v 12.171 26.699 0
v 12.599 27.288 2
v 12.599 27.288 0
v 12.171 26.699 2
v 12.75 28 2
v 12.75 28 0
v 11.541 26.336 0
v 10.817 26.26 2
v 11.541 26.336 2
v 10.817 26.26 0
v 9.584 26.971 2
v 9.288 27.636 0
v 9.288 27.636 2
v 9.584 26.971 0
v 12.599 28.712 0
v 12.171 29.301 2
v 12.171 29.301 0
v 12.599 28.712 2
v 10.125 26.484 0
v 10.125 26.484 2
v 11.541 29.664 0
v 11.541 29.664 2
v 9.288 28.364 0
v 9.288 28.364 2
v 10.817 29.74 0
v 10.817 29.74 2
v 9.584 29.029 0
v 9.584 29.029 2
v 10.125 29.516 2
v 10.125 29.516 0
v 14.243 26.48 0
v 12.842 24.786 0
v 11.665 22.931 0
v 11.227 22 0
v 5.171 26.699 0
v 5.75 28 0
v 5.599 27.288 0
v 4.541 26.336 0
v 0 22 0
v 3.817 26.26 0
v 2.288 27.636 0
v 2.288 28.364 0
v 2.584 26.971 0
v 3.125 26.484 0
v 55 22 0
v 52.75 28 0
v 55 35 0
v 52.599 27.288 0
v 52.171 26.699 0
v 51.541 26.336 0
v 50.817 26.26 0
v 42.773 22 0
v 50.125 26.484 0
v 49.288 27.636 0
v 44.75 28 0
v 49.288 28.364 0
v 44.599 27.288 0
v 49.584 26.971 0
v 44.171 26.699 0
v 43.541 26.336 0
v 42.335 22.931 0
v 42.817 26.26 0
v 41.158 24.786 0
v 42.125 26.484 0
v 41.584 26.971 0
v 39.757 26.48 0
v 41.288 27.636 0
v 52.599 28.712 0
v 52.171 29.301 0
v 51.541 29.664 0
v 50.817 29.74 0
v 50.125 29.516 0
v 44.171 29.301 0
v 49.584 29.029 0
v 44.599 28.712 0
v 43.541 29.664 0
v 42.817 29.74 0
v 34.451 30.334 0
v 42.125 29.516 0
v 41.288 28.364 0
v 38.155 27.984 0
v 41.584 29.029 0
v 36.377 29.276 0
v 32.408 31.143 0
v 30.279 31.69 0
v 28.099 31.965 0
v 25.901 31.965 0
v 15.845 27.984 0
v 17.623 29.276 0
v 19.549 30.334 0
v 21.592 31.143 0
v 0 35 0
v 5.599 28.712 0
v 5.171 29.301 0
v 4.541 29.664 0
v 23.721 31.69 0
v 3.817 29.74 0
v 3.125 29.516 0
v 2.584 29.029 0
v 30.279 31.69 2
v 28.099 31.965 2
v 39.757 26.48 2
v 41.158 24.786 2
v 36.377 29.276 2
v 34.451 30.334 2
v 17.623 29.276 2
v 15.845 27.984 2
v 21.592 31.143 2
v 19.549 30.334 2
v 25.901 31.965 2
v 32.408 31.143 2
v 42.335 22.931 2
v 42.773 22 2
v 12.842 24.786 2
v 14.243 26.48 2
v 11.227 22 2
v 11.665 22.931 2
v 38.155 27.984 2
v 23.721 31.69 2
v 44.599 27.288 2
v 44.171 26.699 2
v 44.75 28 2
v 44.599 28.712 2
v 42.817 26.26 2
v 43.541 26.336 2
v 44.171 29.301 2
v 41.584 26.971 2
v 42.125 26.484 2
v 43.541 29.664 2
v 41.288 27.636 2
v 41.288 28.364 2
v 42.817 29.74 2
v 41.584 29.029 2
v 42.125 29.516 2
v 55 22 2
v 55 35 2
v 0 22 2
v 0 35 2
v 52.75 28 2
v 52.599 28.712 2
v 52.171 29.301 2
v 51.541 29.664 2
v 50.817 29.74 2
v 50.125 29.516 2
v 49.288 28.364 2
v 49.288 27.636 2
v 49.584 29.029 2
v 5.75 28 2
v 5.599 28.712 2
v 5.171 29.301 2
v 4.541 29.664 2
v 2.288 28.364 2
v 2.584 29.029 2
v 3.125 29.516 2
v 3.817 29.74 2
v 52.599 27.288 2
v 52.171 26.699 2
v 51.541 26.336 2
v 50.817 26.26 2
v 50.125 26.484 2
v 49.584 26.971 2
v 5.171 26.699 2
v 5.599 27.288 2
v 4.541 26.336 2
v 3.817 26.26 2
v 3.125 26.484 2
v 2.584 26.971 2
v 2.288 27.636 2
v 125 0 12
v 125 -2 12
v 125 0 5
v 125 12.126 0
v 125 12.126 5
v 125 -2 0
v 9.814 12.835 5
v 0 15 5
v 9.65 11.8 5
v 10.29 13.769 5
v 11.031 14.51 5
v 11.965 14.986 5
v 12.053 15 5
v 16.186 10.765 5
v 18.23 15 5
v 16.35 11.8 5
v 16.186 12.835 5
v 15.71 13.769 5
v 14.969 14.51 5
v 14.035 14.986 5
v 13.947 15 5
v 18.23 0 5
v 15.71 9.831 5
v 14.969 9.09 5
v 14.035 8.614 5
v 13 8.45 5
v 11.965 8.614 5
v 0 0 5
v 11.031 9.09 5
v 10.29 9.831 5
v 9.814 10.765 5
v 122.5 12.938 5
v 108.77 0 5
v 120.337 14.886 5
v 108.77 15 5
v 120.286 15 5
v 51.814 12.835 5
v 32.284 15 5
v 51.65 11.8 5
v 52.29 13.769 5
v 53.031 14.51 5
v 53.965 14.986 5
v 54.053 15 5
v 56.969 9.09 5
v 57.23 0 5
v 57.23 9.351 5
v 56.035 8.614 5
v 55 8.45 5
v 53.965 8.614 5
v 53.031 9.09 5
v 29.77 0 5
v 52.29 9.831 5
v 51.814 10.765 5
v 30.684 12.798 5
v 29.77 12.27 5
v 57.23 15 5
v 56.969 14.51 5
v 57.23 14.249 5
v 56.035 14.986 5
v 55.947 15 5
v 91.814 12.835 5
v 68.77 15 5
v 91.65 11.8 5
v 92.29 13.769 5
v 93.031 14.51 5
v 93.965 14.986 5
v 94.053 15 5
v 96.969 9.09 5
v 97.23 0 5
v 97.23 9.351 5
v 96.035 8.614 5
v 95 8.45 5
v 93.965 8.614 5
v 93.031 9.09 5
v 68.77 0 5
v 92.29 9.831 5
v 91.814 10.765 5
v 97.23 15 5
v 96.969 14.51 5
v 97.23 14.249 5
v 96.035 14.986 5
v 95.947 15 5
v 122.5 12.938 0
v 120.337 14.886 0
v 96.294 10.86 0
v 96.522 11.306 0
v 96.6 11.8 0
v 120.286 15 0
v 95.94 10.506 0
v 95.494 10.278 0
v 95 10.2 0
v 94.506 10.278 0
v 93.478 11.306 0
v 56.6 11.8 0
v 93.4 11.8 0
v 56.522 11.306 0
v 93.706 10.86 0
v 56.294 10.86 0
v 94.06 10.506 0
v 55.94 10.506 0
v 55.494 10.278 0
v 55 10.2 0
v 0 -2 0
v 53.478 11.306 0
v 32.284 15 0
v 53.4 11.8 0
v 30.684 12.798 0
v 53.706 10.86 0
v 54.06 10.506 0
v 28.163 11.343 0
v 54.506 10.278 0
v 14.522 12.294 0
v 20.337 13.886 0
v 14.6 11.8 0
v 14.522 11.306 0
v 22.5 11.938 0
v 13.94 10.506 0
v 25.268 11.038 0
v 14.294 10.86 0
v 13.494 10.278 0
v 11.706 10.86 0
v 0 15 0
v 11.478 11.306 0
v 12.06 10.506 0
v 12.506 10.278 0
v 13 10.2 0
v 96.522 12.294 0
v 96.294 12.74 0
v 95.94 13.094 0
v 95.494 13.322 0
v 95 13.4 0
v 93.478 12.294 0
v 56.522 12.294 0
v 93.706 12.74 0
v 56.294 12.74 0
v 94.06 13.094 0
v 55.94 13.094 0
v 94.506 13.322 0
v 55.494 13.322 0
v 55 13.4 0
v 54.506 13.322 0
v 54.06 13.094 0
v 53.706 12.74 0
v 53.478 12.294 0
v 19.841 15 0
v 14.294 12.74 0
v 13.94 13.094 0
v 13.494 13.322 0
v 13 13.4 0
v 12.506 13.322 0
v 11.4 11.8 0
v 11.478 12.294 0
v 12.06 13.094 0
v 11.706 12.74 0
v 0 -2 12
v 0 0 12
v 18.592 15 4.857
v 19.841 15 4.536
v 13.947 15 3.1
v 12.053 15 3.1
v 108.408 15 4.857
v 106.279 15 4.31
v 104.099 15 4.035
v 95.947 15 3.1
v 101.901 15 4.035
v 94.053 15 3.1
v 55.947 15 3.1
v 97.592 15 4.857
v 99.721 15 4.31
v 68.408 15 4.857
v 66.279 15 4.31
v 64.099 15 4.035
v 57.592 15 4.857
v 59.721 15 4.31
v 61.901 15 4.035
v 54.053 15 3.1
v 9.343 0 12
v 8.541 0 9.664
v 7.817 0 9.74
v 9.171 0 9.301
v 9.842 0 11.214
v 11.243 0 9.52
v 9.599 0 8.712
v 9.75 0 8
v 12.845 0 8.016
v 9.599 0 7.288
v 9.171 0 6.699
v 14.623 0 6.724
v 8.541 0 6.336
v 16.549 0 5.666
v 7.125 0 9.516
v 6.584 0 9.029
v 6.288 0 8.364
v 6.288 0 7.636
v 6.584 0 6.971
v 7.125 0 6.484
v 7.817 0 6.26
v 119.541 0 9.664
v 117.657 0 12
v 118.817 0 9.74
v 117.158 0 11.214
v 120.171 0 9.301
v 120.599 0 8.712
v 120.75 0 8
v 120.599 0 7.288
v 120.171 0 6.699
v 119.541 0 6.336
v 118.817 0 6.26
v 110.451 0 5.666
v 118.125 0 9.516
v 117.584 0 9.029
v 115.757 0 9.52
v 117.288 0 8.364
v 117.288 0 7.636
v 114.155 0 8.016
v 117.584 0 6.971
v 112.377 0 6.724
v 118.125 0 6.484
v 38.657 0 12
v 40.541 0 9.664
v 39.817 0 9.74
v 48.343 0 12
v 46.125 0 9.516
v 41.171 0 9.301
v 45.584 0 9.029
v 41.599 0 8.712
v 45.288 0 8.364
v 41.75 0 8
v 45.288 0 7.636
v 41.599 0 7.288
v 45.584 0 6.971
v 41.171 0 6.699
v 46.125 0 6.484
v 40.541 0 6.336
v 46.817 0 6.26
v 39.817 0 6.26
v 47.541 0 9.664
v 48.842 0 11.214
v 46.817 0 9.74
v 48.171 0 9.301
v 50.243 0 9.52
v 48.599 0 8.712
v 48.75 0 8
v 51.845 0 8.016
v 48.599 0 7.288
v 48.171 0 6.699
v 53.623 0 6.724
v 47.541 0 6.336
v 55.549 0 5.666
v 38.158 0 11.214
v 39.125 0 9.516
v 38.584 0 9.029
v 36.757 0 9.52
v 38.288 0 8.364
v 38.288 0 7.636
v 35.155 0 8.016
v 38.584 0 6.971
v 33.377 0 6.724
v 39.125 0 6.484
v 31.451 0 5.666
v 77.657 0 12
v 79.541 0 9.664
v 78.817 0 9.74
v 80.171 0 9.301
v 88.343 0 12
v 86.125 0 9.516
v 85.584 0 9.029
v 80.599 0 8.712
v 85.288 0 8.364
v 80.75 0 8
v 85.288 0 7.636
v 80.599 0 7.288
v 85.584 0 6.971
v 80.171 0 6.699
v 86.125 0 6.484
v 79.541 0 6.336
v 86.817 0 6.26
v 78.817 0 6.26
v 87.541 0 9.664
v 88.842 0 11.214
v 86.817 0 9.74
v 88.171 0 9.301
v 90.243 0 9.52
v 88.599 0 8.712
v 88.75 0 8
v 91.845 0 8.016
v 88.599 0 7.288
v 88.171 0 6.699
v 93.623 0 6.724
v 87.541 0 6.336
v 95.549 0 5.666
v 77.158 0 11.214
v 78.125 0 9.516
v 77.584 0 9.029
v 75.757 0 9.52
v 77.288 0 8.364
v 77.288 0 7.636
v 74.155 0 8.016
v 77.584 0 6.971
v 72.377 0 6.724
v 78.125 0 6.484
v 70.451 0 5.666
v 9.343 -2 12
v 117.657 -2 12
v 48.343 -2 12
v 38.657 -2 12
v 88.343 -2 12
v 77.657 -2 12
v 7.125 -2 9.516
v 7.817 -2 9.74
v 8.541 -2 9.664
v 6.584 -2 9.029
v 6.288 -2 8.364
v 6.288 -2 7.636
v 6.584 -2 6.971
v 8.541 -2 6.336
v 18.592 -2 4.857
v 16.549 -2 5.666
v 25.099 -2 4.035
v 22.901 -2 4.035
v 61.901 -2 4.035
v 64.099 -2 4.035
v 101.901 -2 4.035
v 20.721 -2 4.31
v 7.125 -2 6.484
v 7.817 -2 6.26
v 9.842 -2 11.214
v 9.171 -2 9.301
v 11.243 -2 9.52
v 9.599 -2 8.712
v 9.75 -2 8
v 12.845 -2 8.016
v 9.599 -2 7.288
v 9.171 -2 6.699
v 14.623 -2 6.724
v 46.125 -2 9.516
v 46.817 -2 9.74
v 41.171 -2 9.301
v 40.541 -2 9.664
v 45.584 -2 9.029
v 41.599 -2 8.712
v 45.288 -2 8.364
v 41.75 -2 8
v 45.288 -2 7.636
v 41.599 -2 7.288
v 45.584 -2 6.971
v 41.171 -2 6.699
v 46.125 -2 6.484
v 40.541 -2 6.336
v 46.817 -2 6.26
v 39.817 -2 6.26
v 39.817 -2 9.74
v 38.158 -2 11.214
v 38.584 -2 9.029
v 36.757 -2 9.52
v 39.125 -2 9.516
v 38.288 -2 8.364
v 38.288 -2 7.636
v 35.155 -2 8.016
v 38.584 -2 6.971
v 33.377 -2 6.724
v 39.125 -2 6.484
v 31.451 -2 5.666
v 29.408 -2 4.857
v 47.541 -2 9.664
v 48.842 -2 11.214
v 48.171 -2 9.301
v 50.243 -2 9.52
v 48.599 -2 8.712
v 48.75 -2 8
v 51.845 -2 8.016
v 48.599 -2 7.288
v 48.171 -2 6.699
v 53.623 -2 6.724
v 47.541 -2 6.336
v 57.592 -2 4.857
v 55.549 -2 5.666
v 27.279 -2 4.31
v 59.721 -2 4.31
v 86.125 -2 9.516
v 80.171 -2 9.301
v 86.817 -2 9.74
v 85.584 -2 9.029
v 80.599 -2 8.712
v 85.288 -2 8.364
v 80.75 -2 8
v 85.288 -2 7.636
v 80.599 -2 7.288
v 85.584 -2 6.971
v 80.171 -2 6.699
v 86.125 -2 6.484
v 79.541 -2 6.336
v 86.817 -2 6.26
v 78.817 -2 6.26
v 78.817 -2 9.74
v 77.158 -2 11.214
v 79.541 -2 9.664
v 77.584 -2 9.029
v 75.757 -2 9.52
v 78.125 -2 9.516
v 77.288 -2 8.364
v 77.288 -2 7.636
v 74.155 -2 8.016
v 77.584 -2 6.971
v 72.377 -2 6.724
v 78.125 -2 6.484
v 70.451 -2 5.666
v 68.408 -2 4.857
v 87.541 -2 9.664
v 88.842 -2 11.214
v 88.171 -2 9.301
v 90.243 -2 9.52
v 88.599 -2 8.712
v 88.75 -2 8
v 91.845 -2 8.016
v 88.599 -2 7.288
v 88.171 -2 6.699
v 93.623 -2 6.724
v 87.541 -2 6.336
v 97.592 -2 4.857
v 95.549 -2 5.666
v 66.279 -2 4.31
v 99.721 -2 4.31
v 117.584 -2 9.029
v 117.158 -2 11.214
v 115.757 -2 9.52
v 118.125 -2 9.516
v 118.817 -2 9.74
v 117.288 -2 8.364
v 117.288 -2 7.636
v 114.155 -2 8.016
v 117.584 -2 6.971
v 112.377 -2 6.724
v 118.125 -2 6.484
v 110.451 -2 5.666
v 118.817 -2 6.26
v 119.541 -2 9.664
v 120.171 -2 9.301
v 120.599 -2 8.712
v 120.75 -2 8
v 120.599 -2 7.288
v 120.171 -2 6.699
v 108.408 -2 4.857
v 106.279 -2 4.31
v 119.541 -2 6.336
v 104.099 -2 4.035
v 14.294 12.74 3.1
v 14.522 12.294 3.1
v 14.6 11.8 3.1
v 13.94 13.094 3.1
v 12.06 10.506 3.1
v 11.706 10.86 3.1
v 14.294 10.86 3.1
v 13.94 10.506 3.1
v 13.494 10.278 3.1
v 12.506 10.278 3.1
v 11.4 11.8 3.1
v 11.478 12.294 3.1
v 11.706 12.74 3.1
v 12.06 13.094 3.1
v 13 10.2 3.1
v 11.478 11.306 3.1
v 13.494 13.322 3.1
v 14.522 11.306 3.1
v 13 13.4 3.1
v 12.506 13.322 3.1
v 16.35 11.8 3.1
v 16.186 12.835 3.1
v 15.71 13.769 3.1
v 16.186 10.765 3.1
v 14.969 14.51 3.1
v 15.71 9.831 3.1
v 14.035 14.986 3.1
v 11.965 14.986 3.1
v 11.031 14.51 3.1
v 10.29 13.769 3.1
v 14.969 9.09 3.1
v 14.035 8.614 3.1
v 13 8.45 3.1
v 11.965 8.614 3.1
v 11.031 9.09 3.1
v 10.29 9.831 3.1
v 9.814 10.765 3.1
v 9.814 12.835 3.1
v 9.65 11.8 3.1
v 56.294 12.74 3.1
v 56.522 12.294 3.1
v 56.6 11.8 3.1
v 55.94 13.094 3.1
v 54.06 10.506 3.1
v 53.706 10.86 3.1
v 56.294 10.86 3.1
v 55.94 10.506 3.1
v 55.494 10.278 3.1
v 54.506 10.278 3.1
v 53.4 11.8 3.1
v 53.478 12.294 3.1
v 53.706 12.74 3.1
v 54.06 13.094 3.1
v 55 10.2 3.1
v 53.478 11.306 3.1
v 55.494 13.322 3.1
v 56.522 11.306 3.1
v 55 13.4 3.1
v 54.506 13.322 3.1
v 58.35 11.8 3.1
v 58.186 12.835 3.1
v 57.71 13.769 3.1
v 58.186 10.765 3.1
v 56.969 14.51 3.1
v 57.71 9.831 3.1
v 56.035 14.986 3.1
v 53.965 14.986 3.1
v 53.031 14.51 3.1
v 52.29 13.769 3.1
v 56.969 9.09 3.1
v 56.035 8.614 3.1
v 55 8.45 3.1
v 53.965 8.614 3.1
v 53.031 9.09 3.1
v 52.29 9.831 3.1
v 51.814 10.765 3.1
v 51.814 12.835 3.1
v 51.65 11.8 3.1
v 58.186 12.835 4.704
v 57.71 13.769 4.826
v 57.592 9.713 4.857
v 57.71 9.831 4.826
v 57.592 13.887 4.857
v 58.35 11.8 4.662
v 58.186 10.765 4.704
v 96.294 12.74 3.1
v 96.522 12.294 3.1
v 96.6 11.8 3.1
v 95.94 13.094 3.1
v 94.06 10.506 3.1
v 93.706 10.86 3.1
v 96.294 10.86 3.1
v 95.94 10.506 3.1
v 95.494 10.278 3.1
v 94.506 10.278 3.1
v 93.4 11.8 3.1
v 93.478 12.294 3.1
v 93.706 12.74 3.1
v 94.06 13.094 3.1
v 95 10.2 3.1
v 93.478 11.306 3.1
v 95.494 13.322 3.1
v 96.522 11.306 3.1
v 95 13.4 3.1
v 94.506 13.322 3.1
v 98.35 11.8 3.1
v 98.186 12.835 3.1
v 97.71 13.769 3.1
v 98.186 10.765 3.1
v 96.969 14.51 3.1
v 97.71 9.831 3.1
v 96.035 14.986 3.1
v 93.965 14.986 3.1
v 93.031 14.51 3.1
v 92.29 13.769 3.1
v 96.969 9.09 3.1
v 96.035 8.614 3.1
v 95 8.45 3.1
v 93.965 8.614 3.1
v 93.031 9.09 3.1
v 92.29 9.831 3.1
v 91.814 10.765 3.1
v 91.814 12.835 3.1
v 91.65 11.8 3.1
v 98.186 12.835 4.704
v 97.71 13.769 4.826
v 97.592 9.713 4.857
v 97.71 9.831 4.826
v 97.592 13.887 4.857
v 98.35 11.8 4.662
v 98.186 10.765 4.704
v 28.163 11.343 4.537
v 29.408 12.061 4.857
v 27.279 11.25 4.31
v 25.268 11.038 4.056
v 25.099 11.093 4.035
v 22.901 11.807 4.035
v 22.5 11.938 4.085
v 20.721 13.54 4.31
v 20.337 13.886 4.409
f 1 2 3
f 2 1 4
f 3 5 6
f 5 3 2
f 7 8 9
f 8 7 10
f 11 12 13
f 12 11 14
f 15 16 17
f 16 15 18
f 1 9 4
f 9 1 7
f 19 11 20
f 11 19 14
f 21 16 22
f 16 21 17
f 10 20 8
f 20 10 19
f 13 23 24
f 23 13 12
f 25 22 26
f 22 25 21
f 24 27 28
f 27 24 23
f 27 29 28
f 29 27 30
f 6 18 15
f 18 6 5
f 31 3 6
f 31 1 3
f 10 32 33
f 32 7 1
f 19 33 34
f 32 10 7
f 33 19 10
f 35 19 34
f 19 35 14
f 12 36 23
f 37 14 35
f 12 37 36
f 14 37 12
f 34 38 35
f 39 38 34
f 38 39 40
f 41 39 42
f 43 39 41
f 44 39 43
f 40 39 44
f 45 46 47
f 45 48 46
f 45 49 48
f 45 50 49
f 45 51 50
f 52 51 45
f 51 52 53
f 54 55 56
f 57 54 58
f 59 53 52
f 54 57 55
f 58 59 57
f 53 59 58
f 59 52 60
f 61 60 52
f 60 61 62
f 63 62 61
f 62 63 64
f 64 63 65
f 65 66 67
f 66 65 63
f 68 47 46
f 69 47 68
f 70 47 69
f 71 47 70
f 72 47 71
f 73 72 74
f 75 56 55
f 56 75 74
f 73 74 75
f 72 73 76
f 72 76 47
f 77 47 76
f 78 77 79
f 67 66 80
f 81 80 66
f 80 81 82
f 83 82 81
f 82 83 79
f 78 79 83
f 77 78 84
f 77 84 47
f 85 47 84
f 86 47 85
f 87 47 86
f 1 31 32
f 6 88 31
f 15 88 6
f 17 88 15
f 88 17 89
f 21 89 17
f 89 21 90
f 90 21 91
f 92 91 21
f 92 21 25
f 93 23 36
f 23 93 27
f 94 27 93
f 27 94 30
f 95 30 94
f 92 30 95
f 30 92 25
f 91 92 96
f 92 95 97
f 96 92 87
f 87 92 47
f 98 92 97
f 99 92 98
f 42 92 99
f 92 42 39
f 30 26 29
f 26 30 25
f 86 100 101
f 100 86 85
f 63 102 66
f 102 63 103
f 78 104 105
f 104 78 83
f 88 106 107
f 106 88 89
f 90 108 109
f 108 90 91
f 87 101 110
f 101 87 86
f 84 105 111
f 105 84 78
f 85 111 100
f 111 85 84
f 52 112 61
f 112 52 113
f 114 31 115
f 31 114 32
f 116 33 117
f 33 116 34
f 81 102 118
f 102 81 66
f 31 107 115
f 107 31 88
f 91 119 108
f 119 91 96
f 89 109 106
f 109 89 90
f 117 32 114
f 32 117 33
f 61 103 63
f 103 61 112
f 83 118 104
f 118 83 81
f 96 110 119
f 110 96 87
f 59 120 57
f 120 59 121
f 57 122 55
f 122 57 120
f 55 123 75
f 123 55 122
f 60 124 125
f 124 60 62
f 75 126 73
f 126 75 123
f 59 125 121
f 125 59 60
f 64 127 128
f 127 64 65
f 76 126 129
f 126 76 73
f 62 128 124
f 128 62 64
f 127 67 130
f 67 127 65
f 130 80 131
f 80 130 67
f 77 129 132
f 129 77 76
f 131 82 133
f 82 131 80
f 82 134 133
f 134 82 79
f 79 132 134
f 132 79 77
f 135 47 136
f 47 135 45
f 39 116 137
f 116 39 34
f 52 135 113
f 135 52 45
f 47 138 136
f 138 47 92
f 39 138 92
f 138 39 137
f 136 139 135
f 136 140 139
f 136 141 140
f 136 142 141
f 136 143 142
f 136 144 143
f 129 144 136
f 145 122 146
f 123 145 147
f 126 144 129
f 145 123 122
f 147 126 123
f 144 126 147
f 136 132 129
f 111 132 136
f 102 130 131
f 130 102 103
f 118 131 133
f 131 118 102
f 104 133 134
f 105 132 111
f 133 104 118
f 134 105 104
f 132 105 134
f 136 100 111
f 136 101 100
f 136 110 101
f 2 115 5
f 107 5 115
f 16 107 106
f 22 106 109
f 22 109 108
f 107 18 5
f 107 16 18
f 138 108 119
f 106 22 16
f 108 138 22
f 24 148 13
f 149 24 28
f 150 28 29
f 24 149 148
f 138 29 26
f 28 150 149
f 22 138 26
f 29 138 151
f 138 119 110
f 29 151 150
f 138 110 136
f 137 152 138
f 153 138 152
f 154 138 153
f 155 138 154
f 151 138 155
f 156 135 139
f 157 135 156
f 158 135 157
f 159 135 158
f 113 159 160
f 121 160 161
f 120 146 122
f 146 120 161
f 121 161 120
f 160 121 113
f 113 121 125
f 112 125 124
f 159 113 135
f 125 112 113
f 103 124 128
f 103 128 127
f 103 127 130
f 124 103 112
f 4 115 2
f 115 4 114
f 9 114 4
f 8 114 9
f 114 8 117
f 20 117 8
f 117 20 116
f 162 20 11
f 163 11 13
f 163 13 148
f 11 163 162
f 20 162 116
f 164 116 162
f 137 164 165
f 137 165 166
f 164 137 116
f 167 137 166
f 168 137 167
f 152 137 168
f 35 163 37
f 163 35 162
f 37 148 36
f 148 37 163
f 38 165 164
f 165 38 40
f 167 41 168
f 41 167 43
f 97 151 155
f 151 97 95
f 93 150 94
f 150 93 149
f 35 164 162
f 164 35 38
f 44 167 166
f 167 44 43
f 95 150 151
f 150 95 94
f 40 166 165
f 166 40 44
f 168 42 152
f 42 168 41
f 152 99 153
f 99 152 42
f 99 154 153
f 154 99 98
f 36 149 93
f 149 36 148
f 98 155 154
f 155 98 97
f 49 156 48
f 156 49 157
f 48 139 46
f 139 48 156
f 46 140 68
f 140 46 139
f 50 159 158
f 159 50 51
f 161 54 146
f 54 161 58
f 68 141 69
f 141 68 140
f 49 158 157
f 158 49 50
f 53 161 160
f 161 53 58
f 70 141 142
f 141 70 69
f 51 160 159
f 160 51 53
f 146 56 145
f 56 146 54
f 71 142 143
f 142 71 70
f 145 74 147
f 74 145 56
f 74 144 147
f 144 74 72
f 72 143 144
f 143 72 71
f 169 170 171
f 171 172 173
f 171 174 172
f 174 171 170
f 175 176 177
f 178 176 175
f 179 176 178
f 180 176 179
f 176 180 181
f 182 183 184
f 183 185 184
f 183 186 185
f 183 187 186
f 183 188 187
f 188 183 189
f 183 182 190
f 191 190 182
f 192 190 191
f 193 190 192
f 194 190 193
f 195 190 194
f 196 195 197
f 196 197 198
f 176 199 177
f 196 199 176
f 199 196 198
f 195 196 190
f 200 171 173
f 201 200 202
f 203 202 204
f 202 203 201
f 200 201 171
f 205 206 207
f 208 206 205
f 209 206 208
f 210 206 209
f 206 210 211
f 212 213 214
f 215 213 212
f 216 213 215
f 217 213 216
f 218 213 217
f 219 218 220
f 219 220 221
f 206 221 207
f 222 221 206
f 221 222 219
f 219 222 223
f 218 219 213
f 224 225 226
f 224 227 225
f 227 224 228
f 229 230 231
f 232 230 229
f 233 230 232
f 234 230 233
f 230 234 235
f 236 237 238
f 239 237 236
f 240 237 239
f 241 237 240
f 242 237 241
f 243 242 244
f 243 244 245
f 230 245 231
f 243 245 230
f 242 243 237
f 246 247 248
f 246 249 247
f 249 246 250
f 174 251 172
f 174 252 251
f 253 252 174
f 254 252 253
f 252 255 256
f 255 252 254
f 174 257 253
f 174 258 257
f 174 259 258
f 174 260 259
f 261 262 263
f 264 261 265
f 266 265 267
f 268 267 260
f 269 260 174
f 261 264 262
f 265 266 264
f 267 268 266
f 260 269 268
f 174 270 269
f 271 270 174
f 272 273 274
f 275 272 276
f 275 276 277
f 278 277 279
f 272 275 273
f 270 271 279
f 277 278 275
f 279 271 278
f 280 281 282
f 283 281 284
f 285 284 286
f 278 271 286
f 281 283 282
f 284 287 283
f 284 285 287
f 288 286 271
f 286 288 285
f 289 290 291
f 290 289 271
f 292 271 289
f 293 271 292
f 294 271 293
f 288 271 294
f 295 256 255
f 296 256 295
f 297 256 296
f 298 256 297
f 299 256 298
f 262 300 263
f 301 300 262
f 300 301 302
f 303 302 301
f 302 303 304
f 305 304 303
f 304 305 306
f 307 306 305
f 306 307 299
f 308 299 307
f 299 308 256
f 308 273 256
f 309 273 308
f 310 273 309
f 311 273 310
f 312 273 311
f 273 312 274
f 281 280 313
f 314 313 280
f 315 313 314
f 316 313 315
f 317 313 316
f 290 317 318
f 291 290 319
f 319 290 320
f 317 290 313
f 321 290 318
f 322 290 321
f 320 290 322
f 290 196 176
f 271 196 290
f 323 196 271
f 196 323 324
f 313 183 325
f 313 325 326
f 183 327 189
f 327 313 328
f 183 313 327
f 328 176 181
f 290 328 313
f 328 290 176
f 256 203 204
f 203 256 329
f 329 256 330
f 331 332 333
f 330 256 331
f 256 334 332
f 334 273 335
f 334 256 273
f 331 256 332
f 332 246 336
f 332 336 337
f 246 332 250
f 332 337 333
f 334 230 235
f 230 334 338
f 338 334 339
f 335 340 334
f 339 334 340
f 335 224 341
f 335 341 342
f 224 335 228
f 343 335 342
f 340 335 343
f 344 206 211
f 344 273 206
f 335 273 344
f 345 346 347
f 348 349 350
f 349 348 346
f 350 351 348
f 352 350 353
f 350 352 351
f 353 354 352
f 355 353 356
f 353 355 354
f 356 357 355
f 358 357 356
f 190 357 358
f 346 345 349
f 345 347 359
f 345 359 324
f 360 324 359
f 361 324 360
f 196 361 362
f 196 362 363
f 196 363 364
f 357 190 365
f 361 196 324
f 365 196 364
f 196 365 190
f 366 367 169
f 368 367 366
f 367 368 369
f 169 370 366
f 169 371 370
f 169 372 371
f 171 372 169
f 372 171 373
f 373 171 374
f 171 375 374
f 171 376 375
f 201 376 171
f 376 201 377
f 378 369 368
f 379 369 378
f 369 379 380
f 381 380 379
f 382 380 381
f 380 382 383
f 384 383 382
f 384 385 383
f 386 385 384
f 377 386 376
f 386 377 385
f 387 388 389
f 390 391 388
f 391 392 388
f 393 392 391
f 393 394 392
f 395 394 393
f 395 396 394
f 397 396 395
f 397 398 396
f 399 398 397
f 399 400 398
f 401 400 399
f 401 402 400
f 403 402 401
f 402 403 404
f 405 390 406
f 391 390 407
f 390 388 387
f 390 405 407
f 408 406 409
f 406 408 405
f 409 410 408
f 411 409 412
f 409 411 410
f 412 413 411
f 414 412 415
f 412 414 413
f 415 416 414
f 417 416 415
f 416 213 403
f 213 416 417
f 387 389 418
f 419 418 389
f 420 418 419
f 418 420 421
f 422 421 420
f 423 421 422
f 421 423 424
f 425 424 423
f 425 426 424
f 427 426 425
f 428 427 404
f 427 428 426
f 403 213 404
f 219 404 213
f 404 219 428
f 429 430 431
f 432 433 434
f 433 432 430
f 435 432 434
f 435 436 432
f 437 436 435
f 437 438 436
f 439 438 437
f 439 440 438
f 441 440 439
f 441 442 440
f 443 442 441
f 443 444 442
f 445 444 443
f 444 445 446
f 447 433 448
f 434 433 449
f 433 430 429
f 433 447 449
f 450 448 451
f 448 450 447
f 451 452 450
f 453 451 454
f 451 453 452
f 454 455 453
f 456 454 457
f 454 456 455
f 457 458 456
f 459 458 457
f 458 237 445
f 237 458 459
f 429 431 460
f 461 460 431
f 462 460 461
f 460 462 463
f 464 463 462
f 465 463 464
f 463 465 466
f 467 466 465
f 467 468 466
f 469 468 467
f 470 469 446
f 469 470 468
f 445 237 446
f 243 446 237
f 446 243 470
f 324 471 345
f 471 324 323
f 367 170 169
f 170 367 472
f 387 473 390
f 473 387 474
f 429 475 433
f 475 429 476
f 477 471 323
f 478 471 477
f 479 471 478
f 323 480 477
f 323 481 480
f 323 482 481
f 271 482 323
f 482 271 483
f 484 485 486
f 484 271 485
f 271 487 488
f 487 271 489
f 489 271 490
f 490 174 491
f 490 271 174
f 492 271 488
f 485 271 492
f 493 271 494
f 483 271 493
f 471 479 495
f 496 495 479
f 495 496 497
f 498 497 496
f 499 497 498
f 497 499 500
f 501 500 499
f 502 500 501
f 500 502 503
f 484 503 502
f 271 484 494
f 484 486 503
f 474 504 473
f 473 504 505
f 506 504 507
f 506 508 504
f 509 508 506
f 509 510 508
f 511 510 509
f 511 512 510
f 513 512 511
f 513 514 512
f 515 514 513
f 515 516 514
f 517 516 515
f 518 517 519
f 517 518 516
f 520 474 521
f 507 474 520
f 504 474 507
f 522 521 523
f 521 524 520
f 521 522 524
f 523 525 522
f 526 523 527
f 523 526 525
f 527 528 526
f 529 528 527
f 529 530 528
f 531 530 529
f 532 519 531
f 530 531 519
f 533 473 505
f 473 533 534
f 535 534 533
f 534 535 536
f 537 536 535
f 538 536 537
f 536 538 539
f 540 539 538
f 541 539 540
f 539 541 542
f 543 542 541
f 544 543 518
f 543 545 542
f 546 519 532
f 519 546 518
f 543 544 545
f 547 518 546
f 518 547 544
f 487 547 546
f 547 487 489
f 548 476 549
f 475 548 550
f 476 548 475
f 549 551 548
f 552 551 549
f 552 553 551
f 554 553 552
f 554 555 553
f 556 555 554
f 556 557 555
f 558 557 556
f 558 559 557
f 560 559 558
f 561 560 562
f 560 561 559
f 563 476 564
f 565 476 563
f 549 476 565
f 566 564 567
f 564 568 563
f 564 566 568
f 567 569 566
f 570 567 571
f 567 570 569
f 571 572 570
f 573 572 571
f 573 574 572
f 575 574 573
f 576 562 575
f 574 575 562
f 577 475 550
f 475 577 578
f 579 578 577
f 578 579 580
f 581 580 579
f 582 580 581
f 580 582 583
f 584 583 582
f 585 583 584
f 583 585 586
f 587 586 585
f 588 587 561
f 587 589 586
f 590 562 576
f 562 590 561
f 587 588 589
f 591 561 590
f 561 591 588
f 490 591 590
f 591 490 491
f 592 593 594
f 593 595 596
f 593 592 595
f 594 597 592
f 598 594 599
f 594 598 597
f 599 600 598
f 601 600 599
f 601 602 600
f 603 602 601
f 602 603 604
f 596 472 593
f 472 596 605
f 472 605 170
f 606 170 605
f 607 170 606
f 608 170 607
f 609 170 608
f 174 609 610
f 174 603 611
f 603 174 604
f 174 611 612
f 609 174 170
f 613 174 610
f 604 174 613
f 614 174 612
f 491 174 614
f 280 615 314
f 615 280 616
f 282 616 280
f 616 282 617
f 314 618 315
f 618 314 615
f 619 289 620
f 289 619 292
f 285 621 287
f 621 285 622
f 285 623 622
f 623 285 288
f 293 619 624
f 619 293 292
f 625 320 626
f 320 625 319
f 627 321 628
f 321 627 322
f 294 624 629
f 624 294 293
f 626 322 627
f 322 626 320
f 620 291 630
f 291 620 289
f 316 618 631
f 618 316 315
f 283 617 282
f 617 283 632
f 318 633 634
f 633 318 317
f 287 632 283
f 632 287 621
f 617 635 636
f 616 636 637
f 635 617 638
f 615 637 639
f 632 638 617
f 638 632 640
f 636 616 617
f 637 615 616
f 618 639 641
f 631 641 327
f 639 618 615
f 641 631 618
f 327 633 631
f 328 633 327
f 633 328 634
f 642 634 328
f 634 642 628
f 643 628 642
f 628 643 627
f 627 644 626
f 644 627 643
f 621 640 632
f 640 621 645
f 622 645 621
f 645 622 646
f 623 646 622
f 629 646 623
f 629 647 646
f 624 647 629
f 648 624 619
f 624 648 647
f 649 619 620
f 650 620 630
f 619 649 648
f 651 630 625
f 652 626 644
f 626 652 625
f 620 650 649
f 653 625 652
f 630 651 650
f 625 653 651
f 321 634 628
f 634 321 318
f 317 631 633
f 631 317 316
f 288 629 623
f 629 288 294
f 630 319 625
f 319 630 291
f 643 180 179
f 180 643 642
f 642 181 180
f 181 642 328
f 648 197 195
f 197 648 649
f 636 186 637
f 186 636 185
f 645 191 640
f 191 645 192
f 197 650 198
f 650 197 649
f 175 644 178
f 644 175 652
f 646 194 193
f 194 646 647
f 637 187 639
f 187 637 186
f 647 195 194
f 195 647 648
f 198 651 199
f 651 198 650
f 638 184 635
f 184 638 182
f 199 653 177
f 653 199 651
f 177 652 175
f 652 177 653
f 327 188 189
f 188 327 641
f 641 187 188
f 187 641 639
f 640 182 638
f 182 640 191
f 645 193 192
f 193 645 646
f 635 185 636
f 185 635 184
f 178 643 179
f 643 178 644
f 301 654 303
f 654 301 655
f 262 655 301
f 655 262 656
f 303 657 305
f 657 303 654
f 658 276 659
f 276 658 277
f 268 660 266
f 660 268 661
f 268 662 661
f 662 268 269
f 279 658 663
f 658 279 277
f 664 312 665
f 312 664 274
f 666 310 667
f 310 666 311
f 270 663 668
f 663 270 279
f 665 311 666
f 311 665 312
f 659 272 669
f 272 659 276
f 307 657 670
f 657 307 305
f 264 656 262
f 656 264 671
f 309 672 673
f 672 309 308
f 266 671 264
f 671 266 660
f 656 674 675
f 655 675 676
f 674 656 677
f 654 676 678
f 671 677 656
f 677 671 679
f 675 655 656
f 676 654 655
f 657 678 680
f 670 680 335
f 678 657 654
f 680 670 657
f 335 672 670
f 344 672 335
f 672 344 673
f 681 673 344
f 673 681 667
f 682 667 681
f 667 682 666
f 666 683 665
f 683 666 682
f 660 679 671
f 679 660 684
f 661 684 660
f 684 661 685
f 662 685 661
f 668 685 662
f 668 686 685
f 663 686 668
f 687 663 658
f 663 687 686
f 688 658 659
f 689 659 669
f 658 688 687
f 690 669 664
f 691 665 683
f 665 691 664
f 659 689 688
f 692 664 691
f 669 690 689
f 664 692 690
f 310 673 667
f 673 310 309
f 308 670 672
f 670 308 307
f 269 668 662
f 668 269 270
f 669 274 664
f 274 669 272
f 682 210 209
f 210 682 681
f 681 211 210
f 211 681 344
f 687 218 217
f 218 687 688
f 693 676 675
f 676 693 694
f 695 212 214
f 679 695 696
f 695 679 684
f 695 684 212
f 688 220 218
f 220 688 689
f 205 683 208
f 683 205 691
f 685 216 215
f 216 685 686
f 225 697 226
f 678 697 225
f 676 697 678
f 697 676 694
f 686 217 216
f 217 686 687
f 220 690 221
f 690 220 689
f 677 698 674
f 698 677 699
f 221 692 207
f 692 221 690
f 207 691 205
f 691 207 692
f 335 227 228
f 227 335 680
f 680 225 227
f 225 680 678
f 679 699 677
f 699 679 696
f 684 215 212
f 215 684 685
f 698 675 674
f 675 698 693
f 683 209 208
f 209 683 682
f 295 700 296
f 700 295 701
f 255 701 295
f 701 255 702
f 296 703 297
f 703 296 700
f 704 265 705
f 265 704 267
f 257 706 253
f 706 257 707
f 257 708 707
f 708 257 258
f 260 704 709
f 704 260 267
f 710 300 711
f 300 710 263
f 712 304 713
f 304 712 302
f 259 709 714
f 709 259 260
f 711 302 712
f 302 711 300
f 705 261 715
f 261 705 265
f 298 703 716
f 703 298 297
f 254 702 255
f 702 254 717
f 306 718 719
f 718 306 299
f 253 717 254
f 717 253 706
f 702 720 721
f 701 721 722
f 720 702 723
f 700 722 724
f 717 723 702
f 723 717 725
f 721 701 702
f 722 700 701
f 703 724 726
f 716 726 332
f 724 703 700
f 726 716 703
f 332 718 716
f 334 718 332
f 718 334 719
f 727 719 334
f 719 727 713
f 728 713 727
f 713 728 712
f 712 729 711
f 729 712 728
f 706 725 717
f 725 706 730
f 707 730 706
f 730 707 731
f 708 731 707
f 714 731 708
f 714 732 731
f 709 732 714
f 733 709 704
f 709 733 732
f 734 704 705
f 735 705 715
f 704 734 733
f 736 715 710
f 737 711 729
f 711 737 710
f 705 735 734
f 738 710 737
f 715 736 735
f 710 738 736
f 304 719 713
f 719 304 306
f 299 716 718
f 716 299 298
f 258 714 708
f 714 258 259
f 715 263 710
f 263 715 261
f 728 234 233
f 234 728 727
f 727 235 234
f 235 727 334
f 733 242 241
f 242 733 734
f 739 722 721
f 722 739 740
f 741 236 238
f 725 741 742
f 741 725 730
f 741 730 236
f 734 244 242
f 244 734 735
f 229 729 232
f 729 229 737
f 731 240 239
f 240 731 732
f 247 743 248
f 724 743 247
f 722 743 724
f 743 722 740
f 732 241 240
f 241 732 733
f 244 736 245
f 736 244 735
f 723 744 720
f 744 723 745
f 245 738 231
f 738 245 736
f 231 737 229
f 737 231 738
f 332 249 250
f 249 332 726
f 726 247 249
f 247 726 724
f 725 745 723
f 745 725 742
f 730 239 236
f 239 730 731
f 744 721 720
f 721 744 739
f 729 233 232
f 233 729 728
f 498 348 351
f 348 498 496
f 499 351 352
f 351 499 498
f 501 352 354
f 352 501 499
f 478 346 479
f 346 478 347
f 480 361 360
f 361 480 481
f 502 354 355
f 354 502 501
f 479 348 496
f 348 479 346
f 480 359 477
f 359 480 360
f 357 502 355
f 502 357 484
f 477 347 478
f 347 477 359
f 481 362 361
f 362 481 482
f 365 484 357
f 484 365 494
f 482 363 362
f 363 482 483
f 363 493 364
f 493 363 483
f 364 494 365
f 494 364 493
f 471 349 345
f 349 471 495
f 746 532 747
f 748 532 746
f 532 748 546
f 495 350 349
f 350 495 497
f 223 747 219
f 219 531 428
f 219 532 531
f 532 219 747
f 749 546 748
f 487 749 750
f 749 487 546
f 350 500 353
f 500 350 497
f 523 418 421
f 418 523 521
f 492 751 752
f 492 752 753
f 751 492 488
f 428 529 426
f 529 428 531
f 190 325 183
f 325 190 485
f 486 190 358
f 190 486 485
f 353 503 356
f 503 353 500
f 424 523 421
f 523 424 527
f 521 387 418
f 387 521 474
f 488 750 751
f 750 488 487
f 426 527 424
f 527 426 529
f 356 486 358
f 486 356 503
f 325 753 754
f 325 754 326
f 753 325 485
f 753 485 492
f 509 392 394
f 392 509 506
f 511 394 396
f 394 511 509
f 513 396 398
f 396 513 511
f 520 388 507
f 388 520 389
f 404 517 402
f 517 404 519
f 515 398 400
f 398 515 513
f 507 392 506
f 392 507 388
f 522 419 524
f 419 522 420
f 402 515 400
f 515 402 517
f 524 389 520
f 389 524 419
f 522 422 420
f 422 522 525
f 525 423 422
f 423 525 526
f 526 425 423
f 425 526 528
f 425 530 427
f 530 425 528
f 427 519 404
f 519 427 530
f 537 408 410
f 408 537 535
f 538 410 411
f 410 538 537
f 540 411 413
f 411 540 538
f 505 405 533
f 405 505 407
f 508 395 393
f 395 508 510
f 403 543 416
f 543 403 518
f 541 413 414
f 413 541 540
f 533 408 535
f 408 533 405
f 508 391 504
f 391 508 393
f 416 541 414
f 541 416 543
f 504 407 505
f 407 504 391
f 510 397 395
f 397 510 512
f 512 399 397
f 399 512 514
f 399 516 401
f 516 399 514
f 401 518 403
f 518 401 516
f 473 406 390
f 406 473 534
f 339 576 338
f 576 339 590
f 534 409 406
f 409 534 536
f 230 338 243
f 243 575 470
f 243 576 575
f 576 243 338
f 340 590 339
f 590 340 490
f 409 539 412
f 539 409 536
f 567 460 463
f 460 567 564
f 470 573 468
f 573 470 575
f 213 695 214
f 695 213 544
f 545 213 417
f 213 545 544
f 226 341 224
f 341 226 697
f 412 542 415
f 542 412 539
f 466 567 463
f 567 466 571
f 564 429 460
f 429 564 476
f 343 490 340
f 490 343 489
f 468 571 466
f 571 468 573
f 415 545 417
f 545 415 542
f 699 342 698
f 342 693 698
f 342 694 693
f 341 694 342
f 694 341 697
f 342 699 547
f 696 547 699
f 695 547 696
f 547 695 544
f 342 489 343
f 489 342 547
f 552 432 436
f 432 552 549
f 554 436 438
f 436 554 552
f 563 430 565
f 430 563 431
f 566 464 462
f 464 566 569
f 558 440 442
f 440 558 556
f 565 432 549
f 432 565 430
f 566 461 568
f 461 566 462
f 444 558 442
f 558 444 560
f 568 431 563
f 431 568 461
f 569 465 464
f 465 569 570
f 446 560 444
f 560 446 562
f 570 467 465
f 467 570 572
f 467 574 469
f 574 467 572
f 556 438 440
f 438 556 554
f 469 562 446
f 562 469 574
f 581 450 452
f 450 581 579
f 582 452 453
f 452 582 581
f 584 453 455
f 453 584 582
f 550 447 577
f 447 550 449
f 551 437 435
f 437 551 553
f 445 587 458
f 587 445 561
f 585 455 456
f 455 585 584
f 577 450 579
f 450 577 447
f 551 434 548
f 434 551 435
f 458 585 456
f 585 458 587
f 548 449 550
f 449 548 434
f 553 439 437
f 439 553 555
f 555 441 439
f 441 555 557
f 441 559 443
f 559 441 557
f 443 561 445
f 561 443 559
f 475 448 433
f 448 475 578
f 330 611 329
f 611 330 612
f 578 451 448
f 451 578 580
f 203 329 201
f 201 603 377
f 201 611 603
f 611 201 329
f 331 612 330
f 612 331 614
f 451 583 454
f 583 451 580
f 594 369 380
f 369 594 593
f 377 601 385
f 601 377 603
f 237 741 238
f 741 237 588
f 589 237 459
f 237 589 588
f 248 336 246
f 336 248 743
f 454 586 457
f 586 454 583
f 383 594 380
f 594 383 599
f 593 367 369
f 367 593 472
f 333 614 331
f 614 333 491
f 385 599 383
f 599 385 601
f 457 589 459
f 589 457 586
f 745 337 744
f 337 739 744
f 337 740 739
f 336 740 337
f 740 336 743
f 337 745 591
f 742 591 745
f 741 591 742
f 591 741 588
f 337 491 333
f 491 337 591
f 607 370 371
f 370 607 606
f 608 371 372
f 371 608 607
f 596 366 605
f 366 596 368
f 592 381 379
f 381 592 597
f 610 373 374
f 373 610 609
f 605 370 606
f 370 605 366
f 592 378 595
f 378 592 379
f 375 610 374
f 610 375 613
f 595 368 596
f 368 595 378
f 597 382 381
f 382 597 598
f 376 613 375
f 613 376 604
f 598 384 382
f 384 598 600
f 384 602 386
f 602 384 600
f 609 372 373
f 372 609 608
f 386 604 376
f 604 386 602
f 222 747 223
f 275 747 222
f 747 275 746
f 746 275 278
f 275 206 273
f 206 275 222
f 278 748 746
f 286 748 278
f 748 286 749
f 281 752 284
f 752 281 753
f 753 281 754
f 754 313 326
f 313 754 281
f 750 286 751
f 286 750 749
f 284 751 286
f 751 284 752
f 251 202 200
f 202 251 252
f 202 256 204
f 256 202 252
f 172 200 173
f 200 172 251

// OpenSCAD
// file: ../libs/hardware-recess.scad
/*
 * A library to make capture holes in material for M3 & M5 hardware and some
 * common mounting patterns.
 * Copyright 2021 Alex Volkov <alex@flamy.ca>
 *
 * Project URL
 * https://github.com/avolkov/openscad-designs
 *
 * License: Attribution-ShareAlike 4.0 International (CC BY-SA)
 * https://creativecommons.org/licenses/by-sa/4.0/
 *
 * Version 0.1 2021-04-05 Initial publication
 */

// Common mounting patterns
ear_thick=8;
stacked_len = ear_thick*3;
screw_mount_space = 20;
screw_mount_offset =7;
total_len = stacked_len + screw_mount_space*2;
mounting_diff = 8;


//Globals for hardware diameters
M3_THREAD_RAD = 1.5;
M5_THREAD_RAD = 2.6;


m3_nut_trap_d = 6.7;
m3_nut_thick= 2.4;

//M3 fastener values
m3_bolt_head_d = 5.6;
m3_bolt_thick = 3.2;

//M5 fastener values
m5_nut_thick = 4;
m5_locknut_thick = 5;
nut_trap_d = 9.7;
bolt_head_d = 8.6;
m5_bolt_head_d = bolt_head_d;


module bolt_nut(hole_len, bolt_d, flip=false){
    /*
    Create a model for a hole with bolt end on one end and nut hole on the other end.
    Note, this functions doesn't subtract the model it only makes the model

    :hole_len: total length of the hole
    :bolt_d: diameter of a blot
    :flip: flip the side with bolt recess
    */
    // currently only implemented for 3mm
    if (flip){
        hole_w_end(hole_len, m3_nut_thick, "hex", bolt_d);
        translate([0,0, hole_len]){
            rotate([180, 0, 0]){
                hole_w_end(hole_len, m3_bolt_thick, "round", bolt_d);
            }
        }
    } else {
        hole_w_end(hole_len, m3_bolt_thick, "round", bolt_d);
        translate([0,0, hole_len]){
            rotate([180, 0, 0]){
                hole_w_end(hole_len, m3_nut_thick, "hex", bolt_d);
            }
        }
    }
}


module hole_w_end(hole_len, trap_height, type, bolt_d, flip=false){
    /*
    Make a hole with an end for bolt or a nut.
    This is a more generic functions replacing m5_ hole-making functions.

    :bolt_d: bolt diameter, i.e. 3, 5 mm
    :type: type of the head hole: 'none', 'hex', 'round
    */
    if (type != "none"){
        cylinder(h=hole_len-trap_height, d=bolt_d, $fn=20);
        if (flip){
            m_recess(trap_height, type, bolt_d);
            translate([0,0,trap_height])
                cylinder(h=hole_len-trap_height, d=bolt_d, $fn=20);

        } else {
                translate([0,0, hole_len - trap_height])
                    m_recess(trap_height, type, bolt_d);
        }
    } else {
        cylinder(h=hole_len, d=bolt_d);
    }
}

module m_recess(length, end_type, bolt_d) {
    /*
    Create nut or bolt capture hole

    :height: length of a mounting hole, including end-mounting hardware
    :end_type: type of the head hole: 'none', 'hex', 'round
    :bolt_d: bolt diameter, i.e. 3, 5 mm
    */
    if (bolt_d >= 3 && bolt_d <= 4){
        //M3
        make_recess(length, end_type, m3_nut_trap_d);
    } else if (bolt_d >= 5 && bolt_d <= 6){
        // M5
        make_recess(length, end_type, nut_trap_d);
    }

}

module make_recess(height, end_type, trap_d){
    /*
    Make recess to capture
    */
    rotate([0, 0,90]){
        if (end_type == "hex"){
            cylinder(h=height, d=trap_d, $fn=6);
        } else if (end_type == "round"){
            cylinder(h=height, d=trap_d, $fn=20);
        }
    }
}


//Functions specific to M5 size,
// TODO rewrite as hole_w_end m_recess
module m5_recess(height, end_type) {
    // nut/bolt capture hole
    rotate([0, 0,90]){
        if (end_type == "hex"){
            cylinder(h=height, d=nut_trap_d, $fn=6);
        } else if (end_type == "round"){
            cylinder(h=height, d=nut_trap_d, $fn=20);
        }
    }
}



module m5_hole_w_end(hole_len, trap_height, type){
    //Given hole lenght and trap height create a nut trap hole
    if (type != "none"){
        cylinder(h=hole_len-trap_height, d=5.3, $fn=20); // M5 hole;
            translate([0,0, hole_len-trap_height])
                m5_recess(trap_height, type);
    } else {
        cylinder(h=hole_len, d=5.3); // M5 hole;
    }
}
module m5_hole_w_ends(hole_len, nut_extra=0){
    m5_hole_w_end(hole_len, m5_nut_thick, "round");
    rotate([0, 180, 0])
        translate([0, 0, - hole_len])
            m5_hole_w_end(hole_len, m5_nut_thick + nut_extra, "hex");
}

module m3_hole_w_ends(hole_len, nut_extra=0){
    hole_w_end(hole_len, m3_nut_thick, "round", m3_bolt_thick);
    hole_w_end(hole_len, m3_nut_thick, "hex", m3_bolt_thick, flip=true);
}

module set_mounting_hole(x_offset, y_offset, thickness, nut_height, end_type){
    /*
    Make a hole in an existing material
    end_type: one of hex, round, none
    */
    translate([x_offset, y_offset, 0]){
        m5_hole_w_end(thickness, nut_height, end_type);
    }
}

module m5_thread(height){
    cylinder(h=height, r1=M5_THREAD_RAD, r2=M5_THREAD_RAD, center=true, $fn=16);
}

module m3_thread(height){
    cylinder(h=height, r1=M3_THREAD_RAD, r2=M3_THREAD_RAD, center=true, $fn=16);
}

module m3_square_nut(depth, height){
    translate([0,0,1])
        cylinder(
        h=height, r1=M3_THREAD_RAD, r2=M3_THREAD_RAD, center=true, $fn=16);

    m_recess(m3_nut_thick, "hex",3);
    translate([0,0,-1])
        cylinder(
            h=depth, r1=M3_THREAD_RAD, r2=M3_THREAD_RAD, center=true, $fn=16);
}



//Mounting Patterns

module mounting_holes_2(fastener_len, nut_height, end_type){
    /* Two-hole mounting pattern for M5 bolts*/
    width_offsetn = 16;
    set_mounting_hole(
        screw_mount_offset,
        width_offset + mounting_diff,
        fastener_len,
        nut_height,
        end_type);

    set_mounting_hole(
        total_len - screw_mount_offset,
        width_offset + mounting_diff,
        fastener_len,
        nut_height,
        end_type);


 }

module mounting_holes(fastener_len, nut_height, end_type){
    /*Four-hole mounting pattern for M5 bolts*/
    width_offset = 16;
    set_mounting_hole(
        screw_mount_offset,
        width_offset + mounting_diff,
        fastener_len,
        nut_height,
        end_type);

    set_mounting_hole(
        screw_mount_offset,
        width_offset - mounting_diff,
        fastener_len,
        nut_height,
        end_type);

    // Side towards the end
    set_mounting_hole(
        total_len - screw_mount_offset,
        width_offset + mounting_diff,
        fastener_len,
        nut_height,
        end_type);

    set_mounting_hole(
        total_len - screw_mount_offset,
        width_offset - mounting_diff,
        fastener_len,
        nut_height,
        end_type);
}
// main file
include <../libs/hardware-recess.scad>;

$fn=15;
m3_d = 3.5;
mount_len = 125;
fan_d=35;

module bracket_mount(bolt_l, mount_offset){
        y_offset = mount_offset + 0.3;
        translate([13, y_offset, 0])hole_w_end(bolt_l+0.5, m3_nut_thick, "round", m3_bolt_thick);
        //translate([13, mount_offset,0]) cylinder(d=m3_d, h=bolt_l);
        translate([55, y_offset,0]) hole_w_end(bolt_l+0.5, m3_nut_thick, "round", m3_bolt_thick);
        translate([95, y_offset,0]) hole_w_end(bolt_l+0.5, m3_nut_thick, "round", m3_bolt_thick);
}

module fan_mount(duct_len){
    translate([8, 0, 8])
            rotate([90,0,0])
                cylinder(d=m3_d, h=5);
    translate([fan_d/2 + 6.5, 5 + duct_len, fan_d/2 + 4])
        rotate([90, 0, 0])
            cylinder(d=fan_d, h=20 + duct_len, $fn=50);
    translate([40, 0, 8])
            rotate([90,0,0])cylinder(d=m3_d, h=5);
}



module bottom_bracket(mount_offset) {
    //fan mounts on the side of the  mks board 
    //mount_offset --  Offset between board mounting screws and board for mounting fans
    difference(){
        union(){
            cube([mount_len, mount_offset, 5]);
            translate([0,-2, 0])
                cube([mount_len, 2, 12]);
        }
        translate([0, m3_d - 1, 0])bracket_mount(5, mount_offset - 6);
        fan_mount(mount_offset);
        translate([39, 0, 0])fan_mount(mount_offset);
        translate([79, 0, 0])fan_mount(mount_offset);
        translate([26, 18, 0])cylinder(d=14, h=5);
        translate([126, 19, 0])cylinder(d=14, h=5);
    }
}


module top_bracket() {
    bottom_offset = 5;
    difference(){
        cube([55, 2, 13]);
        translate([3,5, -1])
            fan_mount(0);
        translate([4, 5, 7])
            rotate([90, 0, 0])
                cylinder(d=m3_d, h=5);
        translate([51, 5, 7])
            rotate([90, 0, 0])
                cylinder(d=m3_d, h=5);
    }
}

translate([0,35,0])
    rotate([90, 0, 0])
        top_bracket();
bottom_bracket(15);
